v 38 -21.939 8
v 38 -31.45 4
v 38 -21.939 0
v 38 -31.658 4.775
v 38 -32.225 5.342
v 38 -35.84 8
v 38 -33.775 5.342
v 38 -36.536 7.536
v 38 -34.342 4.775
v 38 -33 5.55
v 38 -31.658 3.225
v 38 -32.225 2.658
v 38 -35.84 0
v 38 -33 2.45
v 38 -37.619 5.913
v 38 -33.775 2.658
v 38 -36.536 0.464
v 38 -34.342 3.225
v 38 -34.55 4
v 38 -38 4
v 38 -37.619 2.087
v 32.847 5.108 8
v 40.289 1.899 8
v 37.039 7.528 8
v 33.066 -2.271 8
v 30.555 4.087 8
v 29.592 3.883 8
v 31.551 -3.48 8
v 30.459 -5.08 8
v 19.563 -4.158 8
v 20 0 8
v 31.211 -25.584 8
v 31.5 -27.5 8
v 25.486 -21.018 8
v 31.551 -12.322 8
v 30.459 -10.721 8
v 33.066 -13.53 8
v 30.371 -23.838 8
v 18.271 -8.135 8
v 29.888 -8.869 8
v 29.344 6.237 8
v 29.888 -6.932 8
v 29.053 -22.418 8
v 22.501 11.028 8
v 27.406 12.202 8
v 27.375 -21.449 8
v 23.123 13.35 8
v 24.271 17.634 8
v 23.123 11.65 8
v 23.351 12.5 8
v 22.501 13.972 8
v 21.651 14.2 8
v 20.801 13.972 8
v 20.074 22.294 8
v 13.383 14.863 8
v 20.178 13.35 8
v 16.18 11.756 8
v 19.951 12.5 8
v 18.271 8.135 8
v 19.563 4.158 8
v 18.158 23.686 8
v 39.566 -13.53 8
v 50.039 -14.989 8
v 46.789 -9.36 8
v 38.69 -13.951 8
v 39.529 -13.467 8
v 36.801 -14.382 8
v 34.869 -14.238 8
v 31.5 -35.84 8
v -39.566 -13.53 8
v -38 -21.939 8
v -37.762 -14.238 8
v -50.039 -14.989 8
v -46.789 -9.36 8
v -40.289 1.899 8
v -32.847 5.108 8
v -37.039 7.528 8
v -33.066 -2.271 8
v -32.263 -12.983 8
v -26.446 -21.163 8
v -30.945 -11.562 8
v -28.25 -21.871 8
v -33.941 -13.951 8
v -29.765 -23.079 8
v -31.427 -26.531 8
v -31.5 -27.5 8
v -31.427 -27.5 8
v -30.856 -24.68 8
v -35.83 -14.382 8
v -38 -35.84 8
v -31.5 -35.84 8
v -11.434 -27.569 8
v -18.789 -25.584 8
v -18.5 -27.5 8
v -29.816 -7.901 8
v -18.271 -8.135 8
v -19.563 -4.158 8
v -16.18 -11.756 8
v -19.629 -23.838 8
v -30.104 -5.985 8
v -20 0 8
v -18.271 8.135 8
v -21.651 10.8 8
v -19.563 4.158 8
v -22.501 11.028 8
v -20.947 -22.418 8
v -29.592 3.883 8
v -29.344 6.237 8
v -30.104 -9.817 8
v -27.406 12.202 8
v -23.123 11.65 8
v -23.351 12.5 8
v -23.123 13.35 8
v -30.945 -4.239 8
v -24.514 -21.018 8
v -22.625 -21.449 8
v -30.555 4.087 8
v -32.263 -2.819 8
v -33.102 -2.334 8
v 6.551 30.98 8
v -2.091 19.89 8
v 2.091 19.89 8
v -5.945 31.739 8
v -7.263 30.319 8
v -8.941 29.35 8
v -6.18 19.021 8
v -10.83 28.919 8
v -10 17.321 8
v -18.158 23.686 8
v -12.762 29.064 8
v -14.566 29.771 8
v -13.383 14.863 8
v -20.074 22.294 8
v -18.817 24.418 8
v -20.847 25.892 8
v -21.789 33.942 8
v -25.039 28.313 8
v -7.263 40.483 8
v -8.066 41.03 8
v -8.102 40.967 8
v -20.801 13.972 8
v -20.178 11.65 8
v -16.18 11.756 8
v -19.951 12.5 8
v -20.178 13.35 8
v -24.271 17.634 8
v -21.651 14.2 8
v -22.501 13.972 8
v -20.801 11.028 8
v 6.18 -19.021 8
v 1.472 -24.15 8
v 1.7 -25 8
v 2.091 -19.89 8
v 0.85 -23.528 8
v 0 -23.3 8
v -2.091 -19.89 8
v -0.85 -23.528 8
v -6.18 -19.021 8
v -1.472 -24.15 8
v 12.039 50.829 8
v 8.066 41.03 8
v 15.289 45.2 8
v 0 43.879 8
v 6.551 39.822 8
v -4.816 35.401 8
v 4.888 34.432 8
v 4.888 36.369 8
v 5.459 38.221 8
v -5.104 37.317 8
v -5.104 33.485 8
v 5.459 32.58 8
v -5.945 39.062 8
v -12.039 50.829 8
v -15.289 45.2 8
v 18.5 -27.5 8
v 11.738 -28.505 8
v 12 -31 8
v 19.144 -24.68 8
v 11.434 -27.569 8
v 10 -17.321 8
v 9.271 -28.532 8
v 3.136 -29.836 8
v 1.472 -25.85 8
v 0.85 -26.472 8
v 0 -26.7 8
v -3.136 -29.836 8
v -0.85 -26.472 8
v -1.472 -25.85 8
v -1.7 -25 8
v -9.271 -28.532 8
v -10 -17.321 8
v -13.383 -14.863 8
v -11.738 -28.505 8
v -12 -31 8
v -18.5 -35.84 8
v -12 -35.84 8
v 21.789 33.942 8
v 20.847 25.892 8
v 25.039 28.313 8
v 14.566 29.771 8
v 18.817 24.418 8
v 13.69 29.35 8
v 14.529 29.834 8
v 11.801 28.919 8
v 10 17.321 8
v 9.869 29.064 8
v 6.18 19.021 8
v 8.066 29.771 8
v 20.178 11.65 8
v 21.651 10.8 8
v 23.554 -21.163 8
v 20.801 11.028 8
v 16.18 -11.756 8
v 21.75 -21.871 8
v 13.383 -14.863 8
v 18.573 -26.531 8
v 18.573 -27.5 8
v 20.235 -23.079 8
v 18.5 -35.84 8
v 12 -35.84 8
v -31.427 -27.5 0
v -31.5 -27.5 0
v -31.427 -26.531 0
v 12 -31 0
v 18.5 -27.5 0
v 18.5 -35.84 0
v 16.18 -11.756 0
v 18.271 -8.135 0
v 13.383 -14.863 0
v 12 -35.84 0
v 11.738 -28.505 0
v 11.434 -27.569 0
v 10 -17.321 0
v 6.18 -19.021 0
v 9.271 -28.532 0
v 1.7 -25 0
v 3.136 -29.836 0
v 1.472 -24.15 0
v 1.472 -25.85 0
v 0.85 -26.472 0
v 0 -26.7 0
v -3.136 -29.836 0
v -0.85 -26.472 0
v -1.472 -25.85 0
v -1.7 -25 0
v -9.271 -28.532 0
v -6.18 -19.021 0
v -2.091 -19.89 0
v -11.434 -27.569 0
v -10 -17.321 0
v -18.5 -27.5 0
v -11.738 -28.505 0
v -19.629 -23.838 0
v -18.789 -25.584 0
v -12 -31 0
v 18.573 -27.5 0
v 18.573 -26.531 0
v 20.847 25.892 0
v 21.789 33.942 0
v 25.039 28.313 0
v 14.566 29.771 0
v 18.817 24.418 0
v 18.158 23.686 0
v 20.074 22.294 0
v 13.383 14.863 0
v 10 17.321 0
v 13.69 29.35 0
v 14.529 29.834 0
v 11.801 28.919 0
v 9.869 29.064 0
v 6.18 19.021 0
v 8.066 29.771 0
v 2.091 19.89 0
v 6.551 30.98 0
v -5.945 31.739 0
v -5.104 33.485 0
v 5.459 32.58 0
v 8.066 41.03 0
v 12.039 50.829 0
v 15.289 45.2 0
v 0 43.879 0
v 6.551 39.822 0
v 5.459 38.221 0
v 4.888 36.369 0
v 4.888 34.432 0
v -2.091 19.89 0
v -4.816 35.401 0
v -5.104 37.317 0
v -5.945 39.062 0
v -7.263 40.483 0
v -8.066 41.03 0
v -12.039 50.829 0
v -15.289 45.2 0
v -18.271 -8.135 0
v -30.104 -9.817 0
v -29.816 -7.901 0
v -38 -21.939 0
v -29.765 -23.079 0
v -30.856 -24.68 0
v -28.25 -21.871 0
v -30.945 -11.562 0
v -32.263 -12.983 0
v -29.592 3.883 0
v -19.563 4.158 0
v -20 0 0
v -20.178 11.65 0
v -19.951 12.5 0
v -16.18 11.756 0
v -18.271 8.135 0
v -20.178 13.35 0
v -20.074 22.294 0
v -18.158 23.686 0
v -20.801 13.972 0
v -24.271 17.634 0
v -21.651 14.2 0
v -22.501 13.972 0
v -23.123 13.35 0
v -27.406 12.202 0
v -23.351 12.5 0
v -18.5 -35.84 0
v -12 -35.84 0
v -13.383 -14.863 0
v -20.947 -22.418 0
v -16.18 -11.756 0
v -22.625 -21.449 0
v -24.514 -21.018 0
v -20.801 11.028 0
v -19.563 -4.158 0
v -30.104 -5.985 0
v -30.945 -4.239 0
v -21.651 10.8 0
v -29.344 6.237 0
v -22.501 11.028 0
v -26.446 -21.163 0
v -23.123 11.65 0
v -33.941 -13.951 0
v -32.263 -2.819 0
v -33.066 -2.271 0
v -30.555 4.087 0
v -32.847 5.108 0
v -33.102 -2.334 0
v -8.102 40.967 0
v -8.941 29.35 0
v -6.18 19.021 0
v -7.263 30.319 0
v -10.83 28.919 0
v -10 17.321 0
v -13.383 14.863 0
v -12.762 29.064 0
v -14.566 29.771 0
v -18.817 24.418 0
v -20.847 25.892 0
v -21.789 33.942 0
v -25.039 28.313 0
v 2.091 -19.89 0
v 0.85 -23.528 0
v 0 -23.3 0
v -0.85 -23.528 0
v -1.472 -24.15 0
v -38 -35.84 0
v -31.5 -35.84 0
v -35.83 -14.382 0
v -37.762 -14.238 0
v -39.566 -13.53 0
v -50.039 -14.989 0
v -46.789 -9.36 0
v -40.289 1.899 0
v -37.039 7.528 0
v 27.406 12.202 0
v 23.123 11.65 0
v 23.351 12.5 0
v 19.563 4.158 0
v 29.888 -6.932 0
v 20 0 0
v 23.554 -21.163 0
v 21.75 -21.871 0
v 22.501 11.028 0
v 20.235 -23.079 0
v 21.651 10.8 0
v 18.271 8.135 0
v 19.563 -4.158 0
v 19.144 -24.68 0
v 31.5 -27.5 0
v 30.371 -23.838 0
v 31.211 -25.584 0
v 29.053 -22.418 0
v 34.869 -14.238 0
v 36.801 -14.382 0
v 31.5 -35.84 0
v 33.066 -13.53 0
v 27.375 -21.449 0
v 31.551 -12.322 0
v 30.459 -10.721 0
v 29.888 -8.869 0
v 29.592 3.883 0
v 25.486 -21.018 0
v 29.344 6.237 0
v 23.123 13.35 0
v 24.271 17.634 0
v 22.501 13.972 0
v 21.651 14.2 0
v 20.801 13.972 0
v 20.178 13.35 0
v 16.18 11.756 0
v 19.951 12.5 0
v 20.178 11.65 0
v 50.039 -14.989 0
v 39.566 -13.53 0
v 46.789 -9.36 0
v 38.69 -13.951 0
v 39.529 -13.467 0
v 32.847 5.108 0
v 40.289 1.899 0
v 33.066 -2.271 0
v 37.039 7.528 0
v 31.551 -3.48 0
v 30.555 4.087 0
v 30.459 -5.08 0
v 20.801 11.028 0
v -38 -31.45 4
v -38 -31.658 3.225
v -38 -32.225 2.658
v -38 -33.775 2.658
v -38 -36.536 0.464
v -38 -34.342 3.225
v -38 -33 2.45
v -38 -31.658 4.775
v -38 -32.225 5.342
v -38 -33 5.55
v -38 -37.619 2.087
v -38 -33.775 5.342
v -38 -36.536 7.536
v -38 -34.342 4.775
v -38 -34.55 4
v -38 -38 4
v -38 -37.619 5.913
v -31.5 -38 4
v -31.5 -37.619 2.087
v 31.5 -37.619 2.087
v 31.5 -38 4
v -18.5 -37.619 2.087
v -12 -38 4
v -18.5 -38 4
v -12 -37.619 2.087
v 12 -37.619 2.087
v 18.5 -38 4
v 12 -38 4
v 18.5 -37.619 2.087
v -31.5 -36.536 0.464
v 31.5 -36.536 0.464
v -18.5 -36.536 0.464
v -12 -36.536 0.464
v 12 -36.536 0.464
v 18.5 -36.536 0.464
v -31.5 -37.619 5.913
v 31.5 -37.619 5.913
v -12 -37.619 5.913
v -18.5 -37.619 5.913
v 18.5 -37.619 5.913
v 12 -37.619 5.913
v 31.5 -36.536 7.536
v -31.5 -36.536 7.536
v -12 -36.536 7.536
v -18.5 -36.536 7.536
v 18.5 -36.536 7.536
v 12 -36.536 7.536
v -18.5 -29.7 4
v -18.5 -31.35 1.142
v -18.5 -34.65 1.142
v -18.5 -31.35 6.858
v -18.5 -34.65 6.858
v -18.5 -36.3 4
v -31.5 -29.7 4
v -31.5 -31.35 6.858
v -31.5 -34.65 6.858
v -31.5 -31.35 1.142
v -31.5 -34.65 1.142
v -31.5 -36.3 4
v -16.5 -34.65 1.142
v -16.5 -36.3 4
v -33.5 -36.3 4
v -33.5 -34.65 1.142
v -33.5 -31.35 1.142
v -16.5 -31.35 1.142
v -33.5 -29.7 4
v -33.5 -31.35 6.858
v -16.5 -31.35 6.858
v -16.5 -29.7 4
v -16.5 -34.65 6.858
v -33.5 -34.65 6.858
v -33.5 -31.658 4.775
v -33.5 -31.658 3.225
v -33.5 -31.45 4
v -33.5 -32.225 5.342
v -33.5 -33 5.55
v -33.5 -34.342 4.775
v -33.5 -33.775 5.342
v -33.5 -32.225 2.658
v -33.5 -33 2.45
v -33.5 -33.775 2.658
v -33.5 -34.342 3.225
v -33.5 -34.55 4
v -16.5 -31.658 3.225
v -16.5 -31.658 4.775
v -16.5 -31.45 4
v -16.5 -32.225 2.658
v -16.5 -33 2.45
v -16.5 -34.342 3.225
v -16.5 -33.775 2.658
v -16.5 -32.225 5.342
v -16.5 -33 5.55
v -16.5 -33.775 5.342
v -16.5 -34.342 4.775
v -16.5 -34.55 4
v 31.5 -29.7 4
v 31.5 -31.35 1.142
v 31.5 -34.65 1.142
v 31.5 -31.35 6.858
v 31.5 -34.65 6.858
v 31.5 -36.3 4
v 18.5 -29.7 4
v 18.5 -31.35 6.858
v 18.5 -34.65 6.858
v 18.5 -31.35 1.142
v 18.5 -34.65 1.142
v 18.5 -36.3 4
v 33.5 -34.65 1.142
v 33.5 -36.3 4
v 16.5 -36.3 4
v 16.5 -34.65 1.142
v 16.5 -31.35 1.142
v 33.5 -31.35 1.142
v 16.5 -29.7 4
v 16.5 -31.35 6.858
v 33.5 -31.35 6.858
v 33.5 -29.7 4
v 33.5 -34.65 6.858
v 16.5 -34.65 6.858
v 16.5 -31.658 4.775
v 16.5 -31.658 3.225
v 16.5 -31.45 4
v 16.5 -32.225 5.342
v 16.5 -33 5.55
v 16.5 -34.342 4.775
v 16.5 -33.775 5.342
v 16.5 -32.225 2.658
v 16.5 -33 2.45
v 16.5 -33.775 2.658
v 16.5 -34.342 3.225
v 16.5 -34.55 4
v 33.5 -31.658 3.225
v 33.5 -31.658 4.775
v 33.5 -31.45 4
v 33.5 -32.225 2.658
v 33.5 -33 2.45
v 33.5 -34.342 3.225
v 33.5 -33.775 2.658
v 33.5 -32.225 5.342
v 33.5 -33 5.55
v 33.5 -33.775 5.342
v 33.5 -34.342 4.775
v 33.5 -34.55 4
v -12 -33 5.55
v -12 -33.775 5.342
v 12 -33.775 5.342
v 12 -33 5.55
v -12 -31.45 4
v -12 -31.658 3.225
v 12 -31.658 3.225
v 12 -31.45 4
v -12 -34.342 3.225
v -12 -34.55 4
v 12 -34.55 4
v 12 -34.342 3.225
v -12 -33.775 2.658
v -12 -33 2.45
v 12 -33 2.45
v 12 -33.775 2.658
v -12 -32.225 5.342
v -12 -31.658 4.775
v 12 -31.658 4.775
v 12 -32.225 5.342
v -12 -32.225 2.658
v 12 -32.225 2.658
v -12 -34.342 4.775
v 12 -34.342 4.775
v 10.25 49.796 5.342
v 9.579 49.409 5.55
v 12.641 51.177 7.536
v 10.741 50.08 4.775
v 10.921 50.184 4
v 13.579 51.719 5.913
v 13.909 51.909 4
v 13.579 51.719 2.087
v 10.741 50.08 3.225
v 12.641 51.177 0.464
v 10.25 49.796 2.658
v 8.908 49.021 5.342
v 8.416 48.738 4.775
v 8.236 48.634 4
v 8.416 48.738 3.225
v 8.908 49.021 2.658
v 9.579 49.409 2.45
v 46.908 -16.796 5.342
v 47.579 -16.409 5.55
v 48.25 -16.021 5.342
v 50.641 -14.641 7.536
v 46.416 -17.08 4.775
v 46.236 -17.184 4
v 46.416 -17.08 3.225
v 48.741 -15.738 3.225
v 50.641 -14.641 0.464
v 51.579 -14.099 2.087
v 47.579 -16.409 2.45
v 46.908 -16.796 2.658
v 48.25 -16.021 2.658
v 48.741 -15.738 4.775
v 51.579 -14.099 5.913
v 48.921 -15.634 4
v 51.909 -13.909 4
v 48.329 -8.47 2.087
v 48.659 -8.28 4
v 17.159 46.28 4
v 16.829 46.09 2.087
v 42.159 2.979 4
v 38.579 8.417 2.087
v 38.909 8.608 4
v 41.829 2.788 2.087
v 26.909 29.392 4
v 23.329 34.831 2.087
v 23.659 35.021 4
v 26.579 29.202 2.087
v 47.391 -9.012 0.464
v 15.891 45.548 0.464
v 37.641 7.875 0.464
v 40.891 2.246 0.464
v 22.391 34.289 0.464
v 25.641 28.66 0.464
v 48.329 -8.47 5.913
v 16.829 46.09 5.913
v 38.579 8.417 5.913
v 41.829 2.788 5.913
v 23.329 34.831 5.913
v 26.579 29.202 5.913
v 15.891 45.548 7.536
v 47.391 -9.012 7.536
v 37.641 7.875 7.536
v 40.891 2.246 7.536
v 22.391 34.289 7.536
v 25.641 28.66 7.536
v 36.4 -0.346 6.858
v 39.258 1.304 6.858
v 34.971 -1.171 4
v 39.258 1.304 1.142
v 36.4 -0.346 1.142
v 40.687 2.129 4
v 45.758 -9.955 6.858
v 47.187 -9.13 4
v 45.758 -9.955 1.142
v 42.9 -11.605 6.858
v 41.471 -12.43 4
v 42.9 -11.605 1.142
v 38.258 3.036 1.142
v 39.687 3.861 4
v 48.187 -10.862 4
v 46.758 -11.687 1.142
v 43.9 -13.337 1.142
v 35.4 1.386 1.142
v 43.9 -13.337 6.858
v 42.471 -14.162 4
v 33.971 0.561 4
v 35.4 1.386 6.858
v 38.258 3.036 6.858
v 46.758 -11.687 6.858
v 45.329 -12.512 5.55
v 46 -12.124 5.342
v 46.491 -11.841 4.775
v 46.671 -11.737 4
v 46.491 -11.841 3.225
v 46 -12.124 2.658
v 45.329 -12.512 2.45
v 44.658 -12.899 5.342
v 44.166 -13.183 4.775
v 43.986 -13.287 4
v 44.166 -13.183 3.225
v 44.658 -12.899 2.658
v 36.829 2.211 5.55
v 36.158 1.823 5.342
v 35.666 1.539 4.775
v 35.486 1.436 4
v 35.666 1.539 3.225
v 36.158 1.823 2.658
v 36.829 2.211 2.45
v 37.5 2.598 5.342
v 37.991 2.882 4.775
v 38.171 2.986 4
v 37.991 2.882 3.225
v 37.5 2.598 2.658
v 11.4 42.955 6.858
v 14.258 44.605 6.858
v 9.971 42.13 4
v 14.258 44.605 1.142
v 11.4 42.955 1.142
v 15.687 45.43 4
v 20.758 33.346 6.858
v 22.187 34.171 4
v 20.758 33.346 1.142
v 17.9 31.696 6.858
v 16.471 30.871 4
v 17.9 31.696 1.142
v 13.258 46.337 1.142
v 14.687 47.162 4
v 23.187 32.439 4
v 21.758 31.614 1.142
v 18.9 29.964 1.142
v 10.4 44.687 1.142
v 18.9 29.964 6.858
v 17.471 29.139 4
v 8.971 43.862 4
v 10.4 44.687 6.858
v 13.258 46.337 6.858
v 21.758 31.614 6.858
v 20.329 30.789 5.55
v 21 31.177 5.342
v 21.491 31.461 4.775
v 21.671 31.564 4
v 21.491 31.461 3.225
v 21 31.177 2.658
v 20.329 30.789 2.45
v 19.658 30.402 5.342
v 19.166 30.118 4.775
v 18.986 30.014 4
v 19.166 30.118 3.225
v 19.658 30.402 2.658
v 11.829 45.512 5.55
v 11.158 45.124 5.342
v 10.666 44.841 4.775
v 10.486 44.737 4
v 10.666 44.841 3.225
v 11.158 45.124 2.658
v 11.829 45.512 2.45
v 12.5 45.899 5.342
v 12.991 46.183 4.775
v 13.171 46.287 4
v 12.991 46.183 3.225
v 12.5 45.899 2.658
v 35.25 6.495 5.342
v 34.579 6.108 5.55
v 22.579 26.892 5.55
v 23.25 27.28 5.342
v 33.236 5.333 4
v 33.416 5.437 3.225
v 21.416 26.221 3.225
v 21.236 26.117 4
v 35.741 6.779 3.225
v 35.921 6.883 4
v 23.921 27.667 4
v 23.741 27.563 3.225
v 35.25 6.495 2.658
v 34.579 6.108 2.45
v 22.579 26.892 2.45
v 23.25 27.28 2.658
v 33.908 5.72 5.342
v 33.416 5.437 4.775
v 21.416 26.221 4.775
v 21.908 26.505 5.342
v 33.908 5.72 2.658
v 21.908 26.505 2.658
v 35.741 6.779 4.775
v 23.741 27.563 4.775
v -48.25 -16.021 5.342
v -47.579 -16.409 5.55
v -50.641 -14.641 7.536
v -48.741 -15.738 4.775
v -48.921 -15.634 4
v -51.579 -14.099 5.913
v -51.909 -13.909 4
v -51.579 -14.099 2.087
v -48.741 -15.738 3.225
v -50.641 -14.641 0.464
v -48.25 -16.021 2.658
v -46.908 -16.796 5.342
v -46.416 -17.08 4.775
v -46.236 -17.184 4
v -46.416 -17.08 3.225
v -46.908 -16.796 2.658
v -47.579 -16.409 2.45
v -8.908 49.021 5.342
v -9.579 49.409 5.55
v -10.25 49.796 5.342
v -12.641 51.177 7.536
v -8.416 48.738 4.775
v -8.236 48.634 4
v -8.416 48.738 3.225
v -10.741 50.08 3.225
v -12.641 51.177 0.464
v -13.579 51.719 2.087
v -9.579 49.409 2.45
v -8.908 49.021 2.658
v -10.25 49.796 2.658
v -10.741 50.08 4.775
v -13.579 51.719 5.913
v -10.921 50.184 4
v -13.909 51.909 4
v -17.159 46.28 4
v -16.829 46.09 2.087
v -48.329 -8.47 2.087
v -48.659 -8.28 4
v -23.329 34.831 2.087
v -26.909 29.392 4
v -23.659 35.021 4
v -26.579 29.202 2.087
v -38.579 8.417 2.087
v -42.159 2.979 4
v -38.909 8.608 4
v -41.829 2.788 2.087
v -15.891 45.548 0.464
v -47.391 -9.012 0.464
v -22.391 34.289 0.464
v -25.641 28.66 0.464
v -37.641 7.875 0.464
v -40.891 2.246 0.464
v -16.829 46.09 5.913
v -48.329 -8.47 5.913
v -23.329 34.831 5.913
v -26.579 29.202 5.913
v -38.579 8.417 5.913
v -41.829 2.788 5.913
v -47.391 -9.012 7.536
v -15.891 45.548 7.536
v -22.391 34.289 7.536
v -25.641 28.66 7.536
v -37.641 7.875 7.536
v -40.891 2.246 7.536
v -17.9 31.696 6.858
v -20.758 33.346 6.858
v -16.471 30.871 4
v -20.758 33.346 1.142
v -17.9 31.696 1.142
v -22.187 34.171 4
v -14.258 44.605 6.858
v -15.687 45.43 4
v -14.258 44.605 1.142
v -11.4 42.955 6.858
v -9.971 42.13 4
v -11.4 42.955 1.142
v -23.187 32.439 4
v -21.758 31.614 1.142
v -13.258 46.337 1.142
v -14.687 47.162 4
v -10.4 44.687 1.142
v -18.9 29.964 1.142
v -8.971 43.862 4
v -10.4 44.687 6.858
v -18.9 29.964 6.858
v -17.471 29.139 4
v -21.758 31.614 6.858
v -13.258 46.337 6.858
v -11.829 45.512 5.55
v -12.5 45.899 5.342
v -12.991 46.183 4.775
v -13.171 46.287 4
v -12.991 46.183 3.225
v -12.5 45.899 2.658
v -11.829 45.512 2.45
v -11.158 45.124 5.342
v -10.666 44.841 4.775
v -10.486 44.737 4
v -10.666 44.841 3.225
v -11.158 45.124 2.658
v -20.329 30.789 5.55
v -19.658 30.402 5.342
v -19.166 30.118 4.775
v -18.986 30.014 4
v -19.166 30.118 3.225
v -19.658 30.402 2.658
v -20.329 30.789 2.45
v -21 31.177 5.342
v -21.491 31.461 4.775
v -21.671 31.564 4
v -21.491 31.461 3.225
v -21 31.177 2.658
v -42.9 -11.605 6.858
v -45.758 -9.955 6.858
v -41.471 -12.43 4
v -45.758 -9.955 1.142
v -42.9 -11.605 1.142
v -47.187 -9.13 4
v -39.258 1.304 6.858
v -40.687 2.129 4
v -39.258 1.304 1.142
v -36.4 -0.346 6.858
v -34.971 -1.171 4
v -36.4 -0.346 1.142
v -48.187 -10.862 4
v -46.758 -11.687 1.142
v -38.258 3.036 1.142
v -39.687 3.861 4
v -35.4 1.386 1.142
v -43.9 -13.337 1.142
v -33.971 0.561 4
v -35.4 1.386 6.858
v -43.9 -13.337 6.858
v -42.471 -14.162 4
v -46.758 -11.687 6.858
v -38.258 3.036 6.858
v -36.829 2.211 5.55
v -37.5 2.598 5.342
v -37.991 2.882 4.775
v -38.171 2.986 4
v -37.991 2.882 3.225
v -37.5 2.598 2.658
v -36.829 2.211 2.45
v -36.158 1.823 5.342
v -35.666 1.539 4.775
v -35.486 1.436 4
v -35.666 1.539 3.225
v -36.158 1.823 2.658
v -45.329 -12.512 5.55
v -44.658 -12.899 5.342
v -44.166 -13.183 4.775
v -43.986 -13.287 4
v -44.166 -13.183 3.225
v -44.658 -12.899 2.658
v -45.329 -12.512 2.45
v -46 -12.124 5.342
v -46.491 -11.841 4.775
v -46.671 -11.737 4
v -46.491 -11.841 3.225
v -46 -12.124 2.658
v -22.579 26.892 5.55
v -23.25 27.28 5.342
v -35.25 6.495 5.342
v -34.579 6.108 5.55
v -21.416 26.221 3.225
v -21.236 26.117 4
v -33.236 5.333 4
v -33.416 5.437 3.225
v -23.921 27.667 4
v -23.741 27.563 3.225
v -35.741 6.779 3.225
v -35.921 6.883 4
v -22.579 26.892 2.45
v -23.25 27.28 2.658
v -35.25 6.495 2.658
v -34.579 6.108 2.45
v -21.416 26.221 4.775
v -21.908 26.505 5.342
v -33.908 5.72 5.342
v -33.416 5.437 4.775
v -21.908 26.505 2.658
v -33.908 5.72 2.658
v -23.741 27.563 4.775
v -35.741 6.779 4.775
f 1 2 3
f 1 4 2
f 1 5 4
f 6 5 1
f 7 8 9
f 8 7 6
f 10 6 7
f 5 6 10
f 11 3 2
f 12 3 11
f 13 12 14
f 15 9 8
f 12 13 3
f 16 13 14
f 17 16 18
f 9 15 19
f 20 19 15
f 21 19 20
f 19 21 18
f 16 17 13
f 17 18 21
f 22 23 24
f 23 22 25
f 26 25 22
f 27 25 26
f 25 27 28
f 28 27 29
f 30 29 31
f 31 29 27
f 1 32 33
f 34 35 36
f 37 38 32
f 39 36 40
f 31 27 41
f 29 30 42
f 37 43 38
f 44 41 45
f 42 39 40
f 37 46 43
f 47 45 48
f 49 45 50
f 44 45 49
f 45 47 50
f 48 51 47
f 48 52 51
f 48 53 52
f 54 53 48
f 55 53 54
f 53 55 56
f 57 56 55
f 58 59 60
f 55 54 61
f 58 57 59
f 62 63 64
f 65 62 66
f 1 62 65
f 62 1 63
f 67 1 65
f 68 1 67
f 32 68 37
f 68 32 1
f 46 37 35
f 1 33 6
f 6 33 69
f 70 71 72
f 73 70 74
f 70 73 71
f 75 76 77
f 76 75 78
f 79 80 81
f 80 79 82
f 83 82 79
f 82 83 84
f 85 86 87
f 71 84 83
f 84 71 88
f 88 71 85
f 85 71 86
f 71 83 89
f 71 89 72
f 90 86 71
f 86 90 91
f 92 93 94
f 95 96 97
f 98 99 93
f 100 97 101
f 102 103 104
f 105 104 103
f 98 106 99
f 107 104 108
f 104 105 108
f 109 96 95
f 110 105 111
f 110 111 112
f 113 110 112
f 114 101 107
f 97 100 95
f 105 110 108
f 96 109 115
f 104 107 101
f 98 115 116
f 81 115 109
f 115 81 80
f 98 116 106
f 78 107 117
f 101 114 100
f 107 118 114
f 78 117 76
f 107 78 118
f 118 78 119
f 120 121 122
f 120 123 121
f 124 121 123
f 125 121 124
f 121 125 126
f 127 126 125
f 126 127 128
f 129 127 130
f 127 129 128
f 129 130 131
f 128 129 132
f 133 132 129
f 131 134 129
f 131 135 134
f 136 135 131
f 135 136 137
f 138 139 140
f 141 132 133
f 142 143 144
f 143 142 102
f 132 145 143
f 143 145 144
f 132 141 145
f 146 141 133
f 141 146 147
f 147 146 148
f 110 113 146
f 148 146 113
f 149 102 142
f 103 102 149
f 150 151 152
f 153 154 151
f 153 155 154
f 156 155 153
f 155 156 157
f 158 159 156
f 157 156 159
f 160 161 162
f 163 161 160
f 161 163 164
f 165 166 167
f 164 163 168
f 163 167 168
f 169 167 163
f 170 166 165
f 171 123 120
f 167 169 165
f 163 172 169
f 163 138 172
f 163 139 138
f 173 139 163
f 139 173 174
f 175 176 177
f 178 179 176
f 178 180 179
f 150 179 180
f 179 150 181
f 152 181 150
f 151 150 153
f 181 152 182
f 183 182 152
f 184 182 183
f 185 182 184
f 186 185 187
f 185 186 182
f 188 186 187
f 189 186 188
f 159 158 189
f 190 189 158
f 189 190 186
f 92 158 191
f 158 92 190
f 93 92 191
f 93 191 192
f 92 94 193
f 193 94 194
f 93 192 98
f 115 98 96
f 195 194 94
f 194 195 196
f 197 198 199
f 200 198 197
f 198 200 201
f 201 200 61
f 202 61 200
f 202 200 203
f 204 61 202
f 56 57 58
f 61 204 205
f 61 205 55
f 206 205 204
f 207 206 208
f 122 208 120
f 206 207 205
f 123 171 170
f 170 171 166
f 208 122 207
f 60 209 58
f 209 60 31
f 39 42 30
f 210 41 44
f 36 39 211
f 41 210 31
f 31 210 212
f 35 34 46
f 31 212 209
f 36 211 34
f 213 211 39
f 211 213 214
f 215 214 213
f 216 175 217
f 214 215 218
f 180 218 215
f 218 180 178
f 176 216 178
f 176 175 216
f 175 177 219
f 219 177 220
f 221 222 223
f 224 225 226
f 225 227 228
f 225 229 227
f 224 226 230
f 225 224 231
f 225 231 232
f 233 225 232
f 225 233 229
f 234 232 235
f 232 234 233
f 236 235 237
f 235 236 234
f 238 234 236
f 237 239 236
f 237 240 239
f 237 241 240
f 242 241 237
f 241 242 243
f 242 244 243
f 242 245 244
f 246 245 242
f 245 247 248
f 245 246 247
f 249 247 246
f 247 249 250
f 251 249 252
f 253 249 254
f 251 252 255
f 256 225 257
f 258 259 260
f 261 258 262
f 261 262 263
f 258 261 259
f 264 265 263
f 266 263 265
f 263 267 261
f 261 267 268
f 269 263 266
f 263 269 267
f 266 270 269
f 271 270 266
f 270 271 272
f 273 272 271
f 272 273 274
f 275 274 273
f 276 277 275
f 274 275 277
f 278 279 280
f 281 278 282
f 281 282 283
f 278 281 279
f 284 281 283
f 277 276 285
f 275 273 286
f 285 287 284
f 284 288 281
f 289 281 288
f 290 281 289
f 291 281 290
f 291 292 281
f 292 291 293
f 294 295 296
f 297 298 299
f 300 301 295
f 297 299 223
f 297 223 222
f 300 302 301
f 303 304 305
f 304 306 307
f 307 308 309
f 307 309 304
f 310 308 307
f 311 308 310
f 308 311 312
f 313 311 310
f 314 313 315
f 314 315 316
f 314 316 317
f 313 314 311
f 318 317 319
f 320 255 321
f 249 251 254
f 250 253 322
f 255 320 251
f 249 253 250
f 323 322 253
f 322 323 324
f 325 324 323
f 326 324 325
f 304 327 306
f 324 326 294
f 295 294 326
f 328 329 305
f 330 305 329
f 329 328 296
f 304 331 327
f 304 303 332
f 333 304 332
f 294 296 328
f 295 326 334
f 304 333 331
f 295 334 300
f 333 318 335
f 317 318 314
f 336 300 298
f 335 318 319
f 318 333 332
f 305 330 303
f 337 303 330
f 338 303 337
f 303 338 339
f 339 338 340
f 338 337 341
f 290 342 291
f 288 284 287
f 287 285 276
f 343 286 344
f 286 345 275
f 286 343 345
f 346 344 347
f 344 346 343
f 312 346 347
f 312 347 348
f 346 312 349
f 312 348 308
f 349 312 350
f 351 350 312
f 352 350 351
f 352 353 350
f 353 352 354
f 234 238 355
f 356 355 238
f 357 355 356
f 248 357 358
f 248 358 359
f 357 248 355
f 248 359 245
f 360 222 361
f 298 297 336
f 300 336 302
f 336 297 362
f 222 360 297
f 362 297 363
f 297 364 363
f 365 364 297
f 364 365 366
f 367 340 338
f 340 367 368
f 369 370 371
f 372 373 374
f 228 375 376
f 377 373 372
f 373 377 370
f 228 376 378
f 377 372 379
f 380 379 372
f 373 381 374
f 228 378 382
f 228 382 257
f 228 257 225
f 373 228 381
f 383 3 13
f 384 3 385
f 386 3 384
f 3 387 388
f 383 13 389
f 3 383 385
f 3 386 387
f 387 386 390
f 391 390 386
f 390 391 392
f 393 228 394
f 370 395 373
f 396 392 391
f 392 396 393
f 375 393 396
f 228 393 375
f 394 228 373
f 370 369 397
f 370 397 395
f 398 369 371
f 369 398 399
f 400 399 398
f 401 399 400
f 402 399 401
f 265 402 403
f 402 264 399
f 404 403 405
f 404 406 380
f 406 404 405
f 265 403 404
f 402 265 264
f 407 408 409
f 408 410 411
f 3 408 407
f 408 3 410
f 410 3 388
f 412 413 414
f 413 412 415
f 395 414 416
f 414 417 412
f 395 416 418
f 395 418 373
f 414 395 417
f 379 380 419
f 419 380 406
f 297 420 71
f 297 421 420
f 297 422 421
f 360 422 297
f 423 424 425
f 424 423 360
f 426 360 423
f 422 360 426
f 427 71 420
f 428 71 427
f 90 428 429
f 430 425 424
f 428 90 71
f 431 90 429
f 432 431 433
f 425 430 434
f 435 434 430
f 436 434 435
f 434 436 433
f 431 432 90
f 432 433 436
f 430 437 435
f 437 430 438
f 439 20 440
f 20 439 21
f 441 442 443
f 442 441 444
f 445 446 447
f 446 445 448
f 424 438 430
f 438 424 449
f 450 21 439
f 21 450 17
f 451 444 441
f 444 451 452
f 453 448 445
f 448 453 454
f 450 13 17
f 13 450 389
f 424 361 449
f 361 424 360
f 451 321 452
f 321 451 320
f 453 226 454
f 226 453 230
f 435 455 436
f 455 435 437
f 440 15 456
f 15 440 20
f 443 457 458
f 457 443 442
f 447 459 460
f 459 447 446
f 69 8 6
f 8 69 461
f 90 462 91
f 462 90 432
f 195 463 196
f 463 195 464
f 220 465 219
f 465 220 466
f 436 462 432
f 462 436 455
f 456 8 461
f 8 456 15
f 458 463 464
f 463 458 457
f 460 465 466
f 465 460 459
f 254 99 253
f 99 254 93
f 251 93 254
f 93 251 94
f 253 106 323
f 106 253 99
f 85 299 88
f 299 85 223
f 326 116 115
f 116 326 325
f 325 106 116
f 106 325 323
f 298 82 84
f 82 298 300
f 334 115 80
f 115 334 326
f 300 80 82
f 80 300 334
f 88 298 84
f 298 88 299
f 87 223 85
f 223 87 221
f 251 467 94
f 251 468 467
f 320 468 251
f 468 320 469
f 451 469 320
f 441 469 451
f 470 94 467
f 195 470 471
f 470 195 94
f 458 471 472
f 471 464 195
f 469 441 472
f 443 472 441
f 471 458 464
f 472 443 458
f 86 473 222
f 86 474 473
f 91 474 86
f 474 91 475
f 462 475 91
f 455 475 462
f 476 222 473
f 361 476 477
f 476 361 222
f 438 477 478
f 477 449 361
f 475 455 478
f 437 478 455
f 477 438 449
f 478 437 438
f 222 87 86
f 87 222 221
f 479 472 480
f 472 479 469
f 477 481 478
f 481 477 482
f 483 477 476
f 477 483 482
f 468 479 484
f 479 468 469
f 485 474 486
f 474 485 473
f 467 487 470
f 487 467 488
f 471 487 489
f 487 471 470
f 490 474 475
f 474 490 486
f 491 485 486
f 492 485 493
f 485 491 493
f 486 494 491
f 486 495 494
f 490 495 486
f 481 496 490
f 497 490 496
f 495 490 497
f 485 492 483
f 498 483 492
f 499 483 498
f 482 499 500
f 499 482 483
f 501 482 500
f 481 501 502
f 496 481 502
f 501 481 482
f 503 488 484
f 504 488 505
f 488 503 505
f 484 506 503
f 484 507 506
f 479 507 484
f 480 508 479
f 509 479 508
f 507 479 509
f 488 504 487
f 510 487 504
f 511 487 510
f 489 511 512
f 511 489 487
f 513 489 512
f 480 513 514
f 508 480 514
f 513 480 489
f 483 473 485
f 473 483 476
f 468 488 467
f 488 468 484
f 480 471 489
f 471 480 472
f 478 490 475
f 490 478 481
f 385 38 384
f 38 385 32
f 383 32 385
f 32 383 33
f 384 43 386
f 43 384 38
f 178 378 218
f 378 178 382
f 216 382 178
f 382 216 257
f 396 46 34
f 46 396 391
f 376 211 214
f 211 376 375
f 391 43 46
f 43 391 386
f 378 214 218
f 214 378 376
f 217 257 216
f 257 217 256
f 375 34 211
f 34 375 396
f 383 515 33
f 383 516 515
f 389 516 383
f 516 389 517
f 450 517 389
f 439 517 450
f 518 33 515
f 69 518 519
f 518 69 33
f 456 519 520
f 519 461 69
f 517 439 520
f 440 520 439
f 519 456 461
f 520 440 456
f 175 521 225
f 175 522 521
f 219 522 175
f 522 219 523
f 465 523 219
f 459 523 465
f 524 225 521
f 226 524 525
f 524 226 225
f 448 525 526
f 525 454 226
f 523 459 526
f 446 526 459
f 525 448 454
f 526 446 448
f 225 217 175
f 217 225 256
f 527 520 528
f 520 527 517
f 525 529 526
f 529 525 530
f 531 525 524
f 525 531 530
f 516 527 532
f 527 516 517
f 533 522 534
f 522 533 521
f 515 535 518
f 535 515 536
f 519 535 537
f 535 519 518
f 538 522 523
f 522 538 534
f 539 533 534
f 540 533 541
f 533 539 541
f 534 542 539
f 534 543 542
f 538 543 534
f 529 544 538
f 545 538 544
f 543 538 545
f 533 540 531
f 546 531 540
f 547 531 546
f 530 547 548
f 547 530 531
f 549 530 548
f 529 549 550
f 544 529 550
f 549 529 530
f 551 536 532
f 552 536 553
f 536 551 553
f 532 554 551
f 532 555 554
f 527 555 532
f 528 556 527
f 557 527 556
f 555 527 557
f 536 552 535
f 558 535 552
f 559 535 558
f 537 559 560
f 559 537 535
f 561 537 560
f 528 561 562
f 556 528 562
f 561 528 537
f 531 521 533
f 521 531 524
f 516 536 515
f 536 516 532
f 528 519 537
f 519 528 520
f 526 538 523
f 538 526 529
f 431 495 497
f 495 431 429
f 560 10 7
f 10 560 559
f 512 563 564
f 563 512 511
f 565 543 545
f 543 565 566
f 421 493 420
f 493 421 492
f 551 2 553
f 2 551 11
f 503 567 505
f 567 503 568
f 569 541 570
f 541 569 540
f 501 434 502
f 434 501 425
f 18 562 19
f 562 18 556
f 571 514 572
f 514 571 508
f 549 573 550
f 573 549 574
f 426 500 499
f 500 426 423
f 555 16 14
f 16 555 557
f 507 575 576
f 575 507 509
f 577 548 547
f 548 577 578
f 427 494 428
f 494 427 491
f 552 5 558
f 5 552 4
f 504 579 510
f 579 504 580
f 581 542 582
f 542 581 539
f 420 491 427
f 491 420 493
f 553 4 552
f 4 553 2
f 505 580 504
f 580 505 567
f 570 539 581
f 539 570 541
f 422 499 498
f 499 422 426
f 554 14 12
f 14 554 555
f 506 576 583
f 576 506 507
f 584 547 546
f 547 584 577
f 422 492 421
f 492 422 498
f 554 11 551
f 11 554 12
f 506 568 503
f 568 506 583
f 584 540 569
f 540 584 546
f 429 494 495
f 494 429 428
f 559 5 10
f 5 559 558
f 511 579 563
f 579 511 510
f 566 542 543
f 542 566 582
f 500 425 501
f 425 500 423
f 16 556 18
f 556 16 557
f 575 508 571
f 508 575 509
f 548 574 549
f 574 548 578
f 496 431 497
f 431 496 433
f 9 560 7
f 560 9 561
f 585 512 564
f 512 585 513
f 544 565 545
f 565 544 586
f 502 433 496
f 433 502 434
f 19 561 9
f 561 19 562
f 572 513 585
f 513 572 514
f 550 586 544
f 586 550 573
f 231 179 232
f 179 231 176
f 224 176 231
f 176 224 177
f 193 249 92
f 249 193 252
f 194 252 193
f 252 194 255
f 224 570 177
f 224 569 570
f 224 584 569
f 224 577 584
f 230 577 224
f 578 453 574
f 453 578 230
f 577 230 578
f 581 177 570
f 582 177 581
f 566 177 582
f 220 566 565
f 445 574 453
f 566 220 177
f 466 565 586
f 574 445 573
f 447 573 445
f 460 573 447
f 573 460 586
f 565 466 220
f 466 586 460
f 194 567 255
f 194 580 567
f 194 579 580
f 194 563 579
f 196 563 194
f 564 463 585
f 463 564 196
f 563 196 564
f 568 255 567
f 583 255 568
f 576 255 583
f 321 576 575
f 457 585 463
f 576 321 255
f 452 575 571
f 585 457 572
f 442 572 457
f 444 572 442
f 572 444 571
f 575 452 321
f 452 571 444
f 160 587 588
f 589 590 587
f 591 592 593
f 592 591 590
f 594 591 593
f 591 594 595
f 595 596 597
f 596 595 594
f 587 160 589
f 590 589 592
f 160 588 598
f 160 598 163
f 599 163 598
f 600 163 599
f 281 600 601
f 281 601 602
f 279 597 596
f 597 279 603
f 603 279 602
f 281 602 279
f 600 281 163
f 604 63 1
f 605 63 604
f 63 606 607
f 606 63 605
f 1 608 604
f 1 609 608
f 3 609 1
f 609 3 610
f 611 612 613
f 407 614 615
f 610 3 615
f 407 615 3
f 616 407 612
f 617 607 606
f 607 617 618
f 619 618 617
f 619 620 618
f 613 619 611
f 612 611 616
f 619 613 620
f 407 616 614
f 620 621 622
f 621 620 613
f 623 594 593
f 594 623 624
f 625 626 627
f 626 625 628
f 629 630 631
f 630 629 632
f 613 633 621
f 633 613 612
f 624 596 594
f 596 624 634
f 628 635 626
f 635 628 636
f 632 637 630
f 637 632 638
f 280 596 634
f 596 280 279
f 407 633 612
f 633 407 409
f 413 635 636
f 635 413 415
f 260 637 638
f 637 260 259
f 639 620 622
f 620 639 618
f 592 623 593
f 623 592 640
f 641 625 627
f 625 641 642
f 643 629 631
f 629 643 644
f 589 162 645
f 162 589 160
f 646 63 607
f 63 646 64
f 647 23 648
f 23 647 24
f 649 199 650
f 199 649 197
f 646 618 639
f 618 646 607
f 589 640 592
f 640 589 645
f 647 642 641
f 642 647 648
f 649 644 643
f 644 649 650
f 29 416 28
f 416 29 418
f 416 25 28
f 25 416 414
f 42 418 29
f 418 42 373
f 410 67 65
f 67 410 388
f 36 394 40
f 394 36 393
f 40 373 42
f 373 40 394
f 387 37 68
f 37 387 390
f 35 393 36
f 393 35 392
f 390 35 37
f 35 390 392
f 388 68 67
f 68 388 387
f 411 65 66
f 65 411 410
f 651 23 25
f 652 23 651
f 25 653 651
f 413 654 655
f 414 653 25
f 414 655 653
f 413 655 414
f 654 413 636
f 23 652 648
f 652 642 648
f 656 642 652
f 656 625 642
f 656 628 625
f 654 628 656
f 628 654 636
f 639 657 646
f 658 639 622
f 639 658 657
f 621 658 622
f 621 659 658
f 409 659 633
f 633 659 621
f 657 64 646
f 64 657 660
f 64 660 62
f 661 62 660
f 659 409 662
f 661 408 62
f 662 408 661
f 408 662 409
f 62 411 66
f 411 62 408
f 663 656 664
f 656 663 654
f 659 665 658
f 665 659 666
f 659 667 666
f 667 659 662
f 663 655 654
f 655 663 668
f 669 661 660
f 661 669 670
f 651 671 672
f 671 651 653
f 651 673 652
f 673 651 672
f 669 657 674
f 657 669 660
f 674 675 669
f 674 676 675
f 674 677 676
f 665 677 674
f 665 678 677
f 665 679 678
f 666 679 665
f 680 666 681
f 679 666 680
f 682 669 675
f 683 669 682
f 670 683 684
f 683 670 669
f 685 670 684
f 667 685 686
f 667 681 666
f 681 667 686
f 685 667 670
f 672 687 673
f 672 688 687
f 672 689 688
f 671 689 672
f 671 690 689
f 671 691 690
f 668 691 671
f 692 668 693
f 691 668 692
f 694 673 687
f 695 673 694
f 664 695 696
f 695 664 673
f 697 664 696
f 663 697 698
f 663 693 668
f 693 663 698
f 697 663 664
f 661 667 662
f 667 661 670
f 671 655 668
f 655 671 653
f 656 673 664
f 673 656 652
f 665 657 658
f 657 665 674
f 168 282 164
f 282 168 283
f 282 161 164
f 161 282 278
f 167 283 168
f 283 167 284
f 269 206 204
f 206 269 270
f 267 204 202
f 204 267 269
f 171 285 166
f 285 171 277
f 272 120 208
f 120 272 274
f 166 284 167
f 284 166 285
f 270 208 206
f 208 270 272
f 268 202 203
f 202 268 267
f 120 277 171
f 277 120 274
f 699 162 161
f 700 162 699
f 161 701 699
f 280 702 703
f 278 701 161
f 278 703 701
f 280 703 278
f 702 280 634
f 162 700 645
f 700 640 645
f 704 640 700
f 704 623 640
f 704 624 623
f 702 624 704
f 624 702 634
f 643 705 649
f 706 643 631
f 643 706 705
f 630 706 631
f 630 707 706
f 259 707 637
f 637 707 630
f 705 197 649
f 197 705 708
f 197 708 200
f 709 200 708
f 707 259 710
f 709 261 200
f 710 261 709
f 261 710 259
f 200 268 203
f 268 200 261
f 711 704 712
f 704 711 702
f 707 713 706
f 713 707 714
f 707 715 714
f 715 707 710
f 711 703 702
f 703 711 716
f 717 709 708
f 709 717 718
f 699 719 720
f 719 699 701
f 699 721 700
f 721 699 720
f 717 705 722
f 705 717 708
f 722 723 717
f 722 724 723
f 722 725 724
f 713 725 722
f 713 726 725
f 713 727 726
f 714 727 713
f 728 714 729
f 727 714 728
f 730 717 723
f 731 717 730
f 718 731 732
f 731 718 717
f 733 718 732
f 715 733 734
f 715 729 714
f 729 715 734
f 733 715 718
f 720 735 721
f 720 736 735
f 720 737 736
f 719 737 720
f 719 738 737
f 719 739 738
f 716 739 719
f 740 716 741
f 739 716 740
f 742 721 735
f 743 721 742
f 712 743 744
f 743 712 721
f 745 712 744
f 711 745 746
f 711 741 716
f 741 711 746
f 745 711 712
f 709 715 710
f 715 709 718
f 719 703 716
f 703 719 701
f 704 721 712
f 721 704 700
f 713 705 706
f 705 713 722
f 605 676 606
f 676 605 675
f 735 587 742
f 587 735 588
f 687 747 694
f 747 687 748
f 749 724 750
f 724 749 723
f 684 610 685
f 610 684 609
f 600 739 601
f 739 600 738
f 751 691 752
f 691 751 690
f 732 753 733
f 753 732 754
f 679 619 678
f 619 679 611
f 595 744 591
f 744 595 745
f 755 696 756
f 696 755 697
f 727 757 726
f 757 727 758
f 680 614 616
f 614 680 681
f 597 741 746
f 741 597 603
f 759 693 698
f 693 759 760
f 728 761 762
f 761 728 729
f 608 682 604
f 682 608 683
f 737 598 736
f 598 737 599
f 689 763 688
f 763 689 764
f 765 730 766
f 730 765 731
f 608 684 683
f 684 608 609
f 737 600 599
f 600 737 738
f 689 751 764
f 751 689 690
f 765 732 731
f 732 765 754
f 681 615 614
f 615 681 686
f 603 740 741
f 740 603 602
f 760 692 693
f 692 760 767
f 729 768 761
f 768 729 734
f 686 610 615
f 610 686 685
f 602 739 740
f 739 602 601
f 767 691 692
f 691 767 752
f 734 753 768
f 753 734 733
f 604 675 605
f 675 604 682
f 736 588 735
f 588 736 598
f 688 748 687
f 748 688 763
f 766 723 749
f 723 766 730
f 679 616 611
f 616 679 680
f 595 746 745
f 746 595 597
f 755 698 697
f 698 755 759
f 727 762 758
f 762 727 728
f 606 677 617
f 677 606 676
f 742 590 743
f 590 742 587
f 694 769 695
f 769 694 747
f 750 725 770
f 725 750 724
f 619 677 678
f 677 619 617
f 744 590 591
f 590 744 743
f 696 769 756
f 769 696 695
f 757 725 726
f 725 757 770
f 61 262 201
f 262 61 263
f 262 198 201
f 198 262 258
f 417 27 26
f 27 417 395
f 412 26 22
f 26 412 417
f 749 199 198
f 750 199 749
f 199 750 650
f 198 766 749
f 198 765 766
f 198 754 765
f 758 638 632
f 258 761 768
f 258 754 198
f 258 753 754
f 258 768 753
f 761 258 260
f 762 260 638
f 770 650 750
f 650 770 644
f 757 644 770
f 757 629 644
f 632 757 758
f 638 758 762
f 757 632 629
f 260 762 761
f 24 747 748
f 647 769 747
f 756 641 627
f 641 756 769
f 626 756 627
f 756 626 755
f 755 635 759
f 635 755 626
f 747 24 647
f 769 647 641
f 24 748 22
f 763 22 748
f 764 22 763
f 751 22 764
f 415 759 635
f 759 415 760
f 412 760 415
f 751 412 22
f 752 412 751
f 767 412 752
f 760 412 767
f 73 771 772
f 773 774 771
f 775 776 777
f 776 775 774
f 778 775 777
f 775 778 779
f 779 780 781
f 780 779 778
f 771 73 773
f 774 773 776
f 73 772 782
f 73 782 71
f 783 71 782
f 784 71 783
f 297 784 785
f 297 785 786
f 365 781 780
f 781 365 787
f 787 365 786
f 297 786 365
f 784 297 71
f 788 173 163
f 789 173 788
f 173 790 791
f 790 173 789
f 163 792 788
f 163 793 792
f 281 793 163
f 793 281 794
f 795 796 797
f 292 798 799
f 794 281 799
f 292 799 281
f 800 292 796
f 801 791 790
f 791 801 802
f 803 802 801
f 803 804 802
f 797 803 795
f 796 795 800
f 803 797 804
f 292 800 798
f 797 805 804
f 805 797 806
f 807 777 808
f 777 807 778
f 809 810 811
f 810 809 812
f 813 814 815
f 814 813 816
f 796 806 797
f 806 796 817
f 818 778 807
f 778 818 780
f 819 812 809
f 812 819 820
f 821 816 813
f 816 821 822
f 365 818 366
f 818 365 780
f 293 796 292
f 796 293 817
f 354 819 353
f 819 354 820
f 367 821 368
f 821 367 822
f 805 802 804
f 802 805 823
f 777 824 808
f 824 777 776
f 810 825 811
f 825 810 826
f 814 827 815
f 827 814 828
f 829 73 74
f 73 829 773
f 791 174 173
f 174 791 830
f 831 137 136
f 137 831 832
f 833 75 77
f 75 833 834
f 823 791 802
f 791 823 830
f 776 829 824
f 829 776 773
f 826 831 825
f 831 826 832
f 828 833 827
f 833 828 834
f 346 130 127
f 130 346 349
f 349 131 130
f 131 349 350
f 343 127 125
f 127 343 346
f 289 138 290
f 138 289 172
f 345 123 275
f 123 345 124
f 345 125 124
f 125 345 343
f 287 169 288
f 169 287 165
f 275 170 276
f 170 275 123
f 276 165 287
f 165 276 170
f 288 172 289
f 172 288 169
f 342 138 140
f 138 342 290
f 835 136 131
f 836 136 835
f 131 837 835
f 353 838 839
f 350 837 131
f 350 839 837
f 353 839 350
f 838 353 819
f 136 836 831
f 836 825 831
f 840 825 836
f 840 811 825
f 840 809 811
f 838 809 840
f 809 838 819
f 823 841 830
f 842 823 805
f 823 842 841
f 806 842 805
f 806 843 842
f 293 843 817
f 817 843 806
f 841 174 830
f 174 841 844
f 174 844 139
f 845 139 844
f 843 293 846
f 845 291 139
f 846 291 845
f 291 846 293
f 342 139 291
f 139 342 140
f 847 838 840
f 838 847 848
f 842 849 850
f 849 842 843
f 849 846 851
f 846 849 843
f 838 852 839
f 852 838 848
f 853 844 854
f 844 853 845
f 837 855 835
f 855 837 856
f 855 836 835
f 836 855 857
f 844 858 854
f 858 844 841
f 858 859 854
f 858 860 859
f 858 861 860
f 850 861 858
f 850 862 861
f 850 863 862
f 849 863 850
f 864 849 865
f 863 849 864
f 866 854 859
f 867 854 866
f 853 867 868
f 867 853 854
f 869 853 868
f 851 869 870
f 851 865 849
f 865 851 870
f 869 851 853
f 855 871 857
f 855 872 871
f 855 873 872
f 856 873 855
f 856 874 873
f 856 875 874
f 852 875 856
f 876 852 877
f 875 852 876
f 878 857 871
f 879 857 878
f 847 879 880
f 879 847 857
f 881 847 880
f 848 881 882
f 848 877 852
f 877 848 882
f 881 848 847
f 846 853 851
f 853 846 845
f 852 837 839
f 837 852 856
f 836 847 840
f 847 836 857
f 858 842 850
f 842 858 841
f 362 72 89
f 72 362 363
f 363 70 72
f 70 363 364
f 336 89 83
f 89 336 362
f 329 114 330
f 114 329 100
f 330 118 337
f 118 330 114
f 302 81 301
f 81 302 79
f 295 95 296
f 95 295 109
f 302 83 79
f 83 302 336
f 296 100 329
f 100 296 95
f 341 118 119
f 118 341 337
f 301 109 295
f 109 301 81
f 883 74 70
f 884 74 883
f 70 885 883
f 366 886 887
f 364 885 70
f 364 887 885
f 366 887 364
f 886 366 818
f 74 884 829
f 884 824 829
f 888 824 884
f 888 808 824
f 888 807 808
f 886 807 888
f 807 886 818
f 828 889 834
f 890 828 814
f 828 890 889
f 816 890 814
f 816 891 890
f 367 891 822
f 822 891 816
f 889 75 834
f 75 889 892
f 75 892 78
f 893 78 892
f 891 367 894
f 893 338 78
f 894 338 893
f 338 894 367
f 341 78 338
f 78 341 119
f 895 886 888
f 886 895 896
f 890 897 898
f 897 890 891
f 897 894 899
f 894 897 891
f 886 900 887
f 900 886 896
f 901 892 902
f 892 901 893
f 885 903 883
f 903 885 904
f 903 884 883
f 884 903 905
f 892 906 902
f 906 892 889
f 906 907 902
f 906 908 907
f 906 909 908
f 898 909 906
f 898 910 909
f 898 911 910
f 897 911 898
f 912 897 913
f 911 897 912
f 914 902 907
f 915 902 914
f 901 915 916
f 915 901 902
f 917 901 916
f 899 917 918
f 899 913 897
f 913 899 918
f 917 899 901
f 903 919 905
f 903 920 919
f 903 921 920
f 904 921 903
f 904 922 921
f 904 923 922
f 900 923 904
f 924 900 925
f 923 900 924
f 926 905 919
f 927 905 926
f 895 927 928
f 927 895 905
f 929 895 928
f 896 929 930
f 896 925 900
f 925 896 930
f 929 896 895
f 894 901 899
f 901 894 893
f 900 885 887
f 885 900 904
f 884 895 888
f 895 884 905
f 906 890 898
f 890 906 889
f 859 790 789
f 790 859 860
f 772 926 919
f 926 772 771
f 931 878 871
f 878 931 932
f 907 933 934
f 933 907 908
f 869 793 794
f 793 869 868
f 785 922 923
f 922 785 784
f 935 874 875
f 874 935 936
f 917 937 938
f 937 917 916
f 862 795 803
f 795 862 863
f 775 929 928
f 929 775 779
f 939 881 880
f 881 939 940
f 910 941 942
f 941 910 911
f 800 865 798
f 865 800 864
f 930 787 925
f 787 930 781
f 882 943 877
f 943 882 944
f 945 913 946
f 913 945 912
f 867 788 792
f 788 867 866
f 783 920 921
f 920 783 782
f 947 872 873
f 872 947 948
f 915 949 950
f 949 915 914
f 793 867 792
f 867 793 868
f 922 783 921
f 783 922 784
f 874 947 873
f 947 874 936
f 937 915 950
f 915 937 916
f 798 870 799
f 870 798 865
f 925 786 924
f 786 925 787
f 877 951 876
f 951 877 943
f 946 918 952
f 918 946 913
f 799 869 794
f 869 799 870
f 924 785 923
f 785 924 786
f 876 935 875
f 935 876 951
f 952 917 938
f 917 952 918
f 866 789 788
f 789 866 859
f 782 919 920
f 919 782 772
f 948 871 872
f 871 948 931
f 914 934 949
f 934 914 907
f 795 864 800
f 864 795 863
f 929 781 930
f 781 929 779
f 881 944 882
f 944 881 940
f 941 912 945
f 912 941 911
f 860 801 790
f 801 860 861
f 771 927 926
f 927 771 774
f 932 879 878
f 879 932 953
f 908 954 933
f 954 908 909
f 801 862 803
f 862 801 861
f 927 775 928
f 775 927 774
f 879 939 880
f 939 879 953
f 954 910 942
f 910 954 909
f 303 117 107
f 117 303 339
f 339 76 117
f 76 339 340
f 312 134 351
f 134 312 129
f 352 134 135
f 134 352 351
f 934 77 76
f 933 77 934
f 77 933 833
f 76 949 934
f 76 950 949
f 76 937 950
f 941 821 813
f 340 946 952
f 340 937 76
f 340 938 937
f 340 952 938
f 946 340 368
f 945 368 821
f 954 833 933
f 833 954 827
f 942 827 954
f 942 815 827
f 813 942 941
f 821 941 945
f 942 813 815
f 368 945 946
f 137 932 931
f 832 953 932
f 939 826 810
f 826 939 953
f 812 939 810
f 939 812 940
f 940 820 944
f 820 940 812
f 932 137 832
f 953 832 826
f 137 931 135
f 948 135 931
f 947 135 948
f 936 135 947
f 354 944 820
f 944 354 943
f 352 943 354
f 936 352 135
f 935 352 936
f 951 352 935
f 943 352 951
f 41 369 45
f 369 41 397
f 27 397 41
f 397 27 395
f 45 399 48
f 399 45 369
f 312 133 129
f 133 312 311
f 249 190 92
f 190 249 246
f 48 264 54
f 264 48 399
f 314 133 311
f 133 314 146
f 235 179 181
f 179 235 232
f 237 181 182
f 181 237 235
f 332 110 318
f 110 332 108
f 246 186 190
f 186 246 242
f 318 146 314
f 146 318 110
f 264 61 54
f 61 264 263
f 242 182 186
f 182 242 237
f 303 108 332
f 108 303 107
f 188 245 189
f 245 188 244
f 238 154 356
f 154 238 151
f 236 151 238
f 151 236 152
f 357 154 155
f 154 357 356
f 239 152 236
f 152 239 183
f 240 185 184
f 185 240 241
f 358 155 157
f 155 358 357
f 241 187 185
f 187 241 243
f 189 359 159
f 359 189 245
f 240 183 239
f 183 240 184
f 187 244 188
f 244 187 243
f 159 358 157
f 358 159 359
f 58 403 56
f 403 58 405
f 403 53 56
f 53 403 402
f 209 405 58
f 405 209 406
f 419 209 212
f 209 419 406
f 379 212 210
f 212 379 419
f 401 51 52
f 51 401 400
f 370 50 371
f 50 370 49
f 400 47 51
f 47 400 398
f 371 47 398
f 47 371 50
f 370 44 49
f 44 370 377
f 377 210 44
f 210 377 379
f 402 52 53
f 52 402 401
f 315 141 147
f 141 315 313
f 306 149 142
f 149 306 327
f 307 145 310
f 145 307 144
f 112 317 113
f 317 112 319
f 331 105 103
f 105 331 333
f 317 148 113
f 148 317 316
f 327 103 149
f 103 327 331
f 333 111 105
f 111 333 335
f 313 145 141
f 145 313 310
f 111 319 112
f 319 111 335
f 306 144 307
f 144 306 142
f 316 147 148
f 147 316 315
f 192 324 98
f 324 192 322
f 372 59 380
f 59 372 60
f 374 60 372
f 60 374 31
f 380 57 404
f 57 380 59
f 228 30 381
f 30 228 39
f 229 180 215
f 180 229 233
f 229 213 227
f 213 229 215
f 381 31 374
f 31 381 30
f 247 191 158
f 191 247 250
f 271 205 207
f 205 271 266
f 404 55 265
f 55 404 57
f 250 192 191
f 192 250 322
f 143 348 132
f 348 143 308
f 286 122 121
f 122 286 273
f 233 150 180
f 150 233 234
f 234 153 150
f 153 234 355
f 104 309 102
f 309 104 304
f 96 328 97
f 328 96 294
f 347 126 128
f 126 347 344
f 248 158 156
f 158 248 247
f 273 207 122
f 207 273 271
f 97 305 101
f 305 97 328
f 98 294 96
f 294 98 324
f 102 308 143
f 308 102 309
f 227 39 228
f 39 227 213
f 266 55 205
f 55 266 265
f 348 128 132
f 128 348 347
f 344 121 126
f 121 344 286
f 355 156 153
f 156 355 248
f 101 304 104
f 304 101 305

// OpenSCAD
// file: arm.scad
support_width = 10; // The same as in carriage.scad, thoug without clearance
shaft_diam = 5.2;
$fn = 100;

module nut(){
    union(){
        translate([0,0,2])cylinder(25, 1.7, 1.7);
        translate([-0.5,0,5])cylinder(3, 3.5, 3.5, $fn=6);
        translate([-2.2,-3.05,5])cube([10,6.1,3]);
    }
}
module bolt(){
    union(){
        cylinder(25, 1.8, 1.8);
        cylinder(3, 3.5, 3.5, $fn=6);
    }
}

module stopper(){
    
     difference(){
        union(){
            translate([0,0,-3])cube([10,10,support_width+6]);
            // fin 1
            translate([-7,1,-3])cube([7,9,3]);
            translate([-7,5.5,-3])cylinder(r=4.5, h=3);
            // fin 2
            translate([-7,1,support_width])cube([7,9,3]);
            translate([-7,5.5,support_width])cylinder(r=4.5, h=3);
        }
        union(){
            rotate([0,0,45])translate([-5,-9,-4])cube([20,10,support_width+8]);
            translate([-19.3,6,-0.1])cylinder(r=20, h=support_width+0.2);
        }
        //translate([-5.25,5.5,-11])nut();
        rotate([0,180,0])translate([5.25,5.5,-14])bolt();
        translate([-19,6,-4])cylinder(r=10, h=20);
    }
    
    
    
}


module arm(){
    
    
    difference(){
        union(){
            difference(){
                cylinder(r=10, h=support_width+10);
                translate([1,0,15])rotate([0,-90,0])nut();
            }
            cylinder(r=20, h=support_width);
            difference(){
                translate([10,0,0])rotate([0,0,8])cube([10,110,support_width]);
                translate([-15.35,105,-1])rotate([0,0,-8])cube([10,10,support_width+2]);
                translate([-10,108,-1])cube([20,10,support_width+2]);
            }
            translate([-20,0,0])rotate([0,0,-8])cube([10,108,support_width]);
        }
        translate([0,0,-1])cylinder(r=shaft_diam/2, h=30);
        // Mounting hole
        // Long hole
        //translate([-20,70,((support_width/2)-(3.4/2))])rotate([0,0,10])cube([40,30,3.4]);
        // left hand
        //translate([-20,97,support_width/2])rotate([-10,90,0])cylinder(r=1.7, h=40);
        // Right hand
        translate([-20,102,support_width/2])rotate([10,90,0])cylinder(r=1.7, h=40);
        
        // Endswitch stopper mounting
        translate([0,0,-1])difference(){
            cylinder(r=16, h=support_width+2);
            translate([0,0,-1])cylinder(r=12.7, h=support_width+4);
            translate([-25,-20,-1])rotate([0,0,30])cube([50,30,support_width+4]);
        }
        
        
    }
    
    rotate([0,0,-80])translate([20.5,0,0])rotate([0,0,17])stopper();
}


arm();
// file: carriage.scad
use <arm.scad>
//$fn = 100;
support_width = 10.6;
width = 76;
height = 24;

offset = 25;
cutout = 13;
middle = 2*offset - width/2;

module parallel_joints(reinforced) {
    difference() {
        union() {
            intersection() {
                cube([width, 20, 8], center=true);
                rotate([0, 90, 0]) cylinder(r=5, h=width, center=true);
            }
            
            translate([0, 8, 0]) cube([width, 16, 8], center=true);
            
            intersection() {
                translate([0, 18, 4]) rotate([45, 0, 0])cube([width, reinforced, reinforced], center=true);
                translate([0, 0, 16]) cube([width, 35, 40], center=true);
            }
        }

        rotate([0, 90, 0]) cylinder(r=1.55, h=80, center=true, $fn=12);

        for (x = [-offset, offset]) {
            translate([x, 5.5, 0])cylinder(r=cutout/2, h=100, center=true);
            translate([x, -4.5, 0])cube([cutout, 20, 100], center=true);
            translate([x, 0, 0]) rotate([0, 90, 0]) rotate([0, 0, 30])cylinder(r=3.3, h=17, center=true, $fn=6);
        }

        translate([0, 2, 0]) cylinder(r=middle, h=100, center=true);
        translate([0, -8, 0]) cube([2*middle, 20, 100], center=true);
    }
}



module carriage() {
    difference(){
        union(){
            difference(){
                parallel_joints(16);
                union(){
                    mirror([1,0,0])translate([39,11,-5])intersection(){
                        translate([-10,-8, 0])cube([10,16,25]);
                        translate([0, 0, 0])rotate([0,0,45])cube([10,10,25]);
                    }
                    translate([39,11,-5])intersection(){
                        translate([-10,-8, 0])cube([10,16,25]);
                        translate([0, 0, 0])rotate([0,0,45])cube([10,10,25]);
                    }
                }
            }
            difference(){
                translate([0, 9.5, -4])union(){
                    translate([20,0,0])intersection(){
                        translate([0, 8, 0])cube([10,16,20]);
                        translate([0, 0, 0])rotate([0,0,45])cube([10,10,20]);
                    }
                    translate([-20, 8, 0])cube([40,6.1,20]);
                    mirror([1,0,0])translate([20,0,0])intersection(){
                        translate([0, 8, 0])cube([10,16,20]);
                        translate([0, 0, 0])rotate([0,0,45])cube([10,10,20]);
                    }
                }
                w=support_width;
                translate([-(w/2), 18, -5])cube([w,10,25]);
            }
        }
        translate([-50, 10, 12])cube([100,20,15]);
        // bolt hole
        translate([0,10,3])rotate([90, 90, 0]) cylinder(r=1.55, h=30, center=true, $fn=12);
    }
    
}

carriage();
//rotate([0,0,90])carriage();
//translate([-38.6,5,-96])rotate([90,10,0])arm();
// main file
use <carriage.scad>

//$fn = 100;
h=8;
platform_hinge_offset = 33; 
cutout = 12.5;
inset = 6;

module platform() {
  translate([0, 0, h/2]) 
  difference() {
    union() {
      for (a = [0:120:359]) {
        rotate([0, 0, a]) {
          translate([0, -platform_hinge_offset, 0]) parallel_joints(0);
          // Close little triangle holes.
          translate([0, 31, 0]) cylinder(r=5, h=h, center=true);
        }
      }
      cylinder(r=30, h=h, center=true);
    }
    cylinder(r=20, h=h+12, center=true);
    for (a = [0:2]) {
      rotate(a*120) {
        //translate([0, -25, 0])cylinder(r=2.2, h=h+1, center=true, $fn=12);
        translate([0, -25, 0])cylinder(r=1.7, h=h+1, center=true, $fn=12);
      }
    }
  }
}

platform();
